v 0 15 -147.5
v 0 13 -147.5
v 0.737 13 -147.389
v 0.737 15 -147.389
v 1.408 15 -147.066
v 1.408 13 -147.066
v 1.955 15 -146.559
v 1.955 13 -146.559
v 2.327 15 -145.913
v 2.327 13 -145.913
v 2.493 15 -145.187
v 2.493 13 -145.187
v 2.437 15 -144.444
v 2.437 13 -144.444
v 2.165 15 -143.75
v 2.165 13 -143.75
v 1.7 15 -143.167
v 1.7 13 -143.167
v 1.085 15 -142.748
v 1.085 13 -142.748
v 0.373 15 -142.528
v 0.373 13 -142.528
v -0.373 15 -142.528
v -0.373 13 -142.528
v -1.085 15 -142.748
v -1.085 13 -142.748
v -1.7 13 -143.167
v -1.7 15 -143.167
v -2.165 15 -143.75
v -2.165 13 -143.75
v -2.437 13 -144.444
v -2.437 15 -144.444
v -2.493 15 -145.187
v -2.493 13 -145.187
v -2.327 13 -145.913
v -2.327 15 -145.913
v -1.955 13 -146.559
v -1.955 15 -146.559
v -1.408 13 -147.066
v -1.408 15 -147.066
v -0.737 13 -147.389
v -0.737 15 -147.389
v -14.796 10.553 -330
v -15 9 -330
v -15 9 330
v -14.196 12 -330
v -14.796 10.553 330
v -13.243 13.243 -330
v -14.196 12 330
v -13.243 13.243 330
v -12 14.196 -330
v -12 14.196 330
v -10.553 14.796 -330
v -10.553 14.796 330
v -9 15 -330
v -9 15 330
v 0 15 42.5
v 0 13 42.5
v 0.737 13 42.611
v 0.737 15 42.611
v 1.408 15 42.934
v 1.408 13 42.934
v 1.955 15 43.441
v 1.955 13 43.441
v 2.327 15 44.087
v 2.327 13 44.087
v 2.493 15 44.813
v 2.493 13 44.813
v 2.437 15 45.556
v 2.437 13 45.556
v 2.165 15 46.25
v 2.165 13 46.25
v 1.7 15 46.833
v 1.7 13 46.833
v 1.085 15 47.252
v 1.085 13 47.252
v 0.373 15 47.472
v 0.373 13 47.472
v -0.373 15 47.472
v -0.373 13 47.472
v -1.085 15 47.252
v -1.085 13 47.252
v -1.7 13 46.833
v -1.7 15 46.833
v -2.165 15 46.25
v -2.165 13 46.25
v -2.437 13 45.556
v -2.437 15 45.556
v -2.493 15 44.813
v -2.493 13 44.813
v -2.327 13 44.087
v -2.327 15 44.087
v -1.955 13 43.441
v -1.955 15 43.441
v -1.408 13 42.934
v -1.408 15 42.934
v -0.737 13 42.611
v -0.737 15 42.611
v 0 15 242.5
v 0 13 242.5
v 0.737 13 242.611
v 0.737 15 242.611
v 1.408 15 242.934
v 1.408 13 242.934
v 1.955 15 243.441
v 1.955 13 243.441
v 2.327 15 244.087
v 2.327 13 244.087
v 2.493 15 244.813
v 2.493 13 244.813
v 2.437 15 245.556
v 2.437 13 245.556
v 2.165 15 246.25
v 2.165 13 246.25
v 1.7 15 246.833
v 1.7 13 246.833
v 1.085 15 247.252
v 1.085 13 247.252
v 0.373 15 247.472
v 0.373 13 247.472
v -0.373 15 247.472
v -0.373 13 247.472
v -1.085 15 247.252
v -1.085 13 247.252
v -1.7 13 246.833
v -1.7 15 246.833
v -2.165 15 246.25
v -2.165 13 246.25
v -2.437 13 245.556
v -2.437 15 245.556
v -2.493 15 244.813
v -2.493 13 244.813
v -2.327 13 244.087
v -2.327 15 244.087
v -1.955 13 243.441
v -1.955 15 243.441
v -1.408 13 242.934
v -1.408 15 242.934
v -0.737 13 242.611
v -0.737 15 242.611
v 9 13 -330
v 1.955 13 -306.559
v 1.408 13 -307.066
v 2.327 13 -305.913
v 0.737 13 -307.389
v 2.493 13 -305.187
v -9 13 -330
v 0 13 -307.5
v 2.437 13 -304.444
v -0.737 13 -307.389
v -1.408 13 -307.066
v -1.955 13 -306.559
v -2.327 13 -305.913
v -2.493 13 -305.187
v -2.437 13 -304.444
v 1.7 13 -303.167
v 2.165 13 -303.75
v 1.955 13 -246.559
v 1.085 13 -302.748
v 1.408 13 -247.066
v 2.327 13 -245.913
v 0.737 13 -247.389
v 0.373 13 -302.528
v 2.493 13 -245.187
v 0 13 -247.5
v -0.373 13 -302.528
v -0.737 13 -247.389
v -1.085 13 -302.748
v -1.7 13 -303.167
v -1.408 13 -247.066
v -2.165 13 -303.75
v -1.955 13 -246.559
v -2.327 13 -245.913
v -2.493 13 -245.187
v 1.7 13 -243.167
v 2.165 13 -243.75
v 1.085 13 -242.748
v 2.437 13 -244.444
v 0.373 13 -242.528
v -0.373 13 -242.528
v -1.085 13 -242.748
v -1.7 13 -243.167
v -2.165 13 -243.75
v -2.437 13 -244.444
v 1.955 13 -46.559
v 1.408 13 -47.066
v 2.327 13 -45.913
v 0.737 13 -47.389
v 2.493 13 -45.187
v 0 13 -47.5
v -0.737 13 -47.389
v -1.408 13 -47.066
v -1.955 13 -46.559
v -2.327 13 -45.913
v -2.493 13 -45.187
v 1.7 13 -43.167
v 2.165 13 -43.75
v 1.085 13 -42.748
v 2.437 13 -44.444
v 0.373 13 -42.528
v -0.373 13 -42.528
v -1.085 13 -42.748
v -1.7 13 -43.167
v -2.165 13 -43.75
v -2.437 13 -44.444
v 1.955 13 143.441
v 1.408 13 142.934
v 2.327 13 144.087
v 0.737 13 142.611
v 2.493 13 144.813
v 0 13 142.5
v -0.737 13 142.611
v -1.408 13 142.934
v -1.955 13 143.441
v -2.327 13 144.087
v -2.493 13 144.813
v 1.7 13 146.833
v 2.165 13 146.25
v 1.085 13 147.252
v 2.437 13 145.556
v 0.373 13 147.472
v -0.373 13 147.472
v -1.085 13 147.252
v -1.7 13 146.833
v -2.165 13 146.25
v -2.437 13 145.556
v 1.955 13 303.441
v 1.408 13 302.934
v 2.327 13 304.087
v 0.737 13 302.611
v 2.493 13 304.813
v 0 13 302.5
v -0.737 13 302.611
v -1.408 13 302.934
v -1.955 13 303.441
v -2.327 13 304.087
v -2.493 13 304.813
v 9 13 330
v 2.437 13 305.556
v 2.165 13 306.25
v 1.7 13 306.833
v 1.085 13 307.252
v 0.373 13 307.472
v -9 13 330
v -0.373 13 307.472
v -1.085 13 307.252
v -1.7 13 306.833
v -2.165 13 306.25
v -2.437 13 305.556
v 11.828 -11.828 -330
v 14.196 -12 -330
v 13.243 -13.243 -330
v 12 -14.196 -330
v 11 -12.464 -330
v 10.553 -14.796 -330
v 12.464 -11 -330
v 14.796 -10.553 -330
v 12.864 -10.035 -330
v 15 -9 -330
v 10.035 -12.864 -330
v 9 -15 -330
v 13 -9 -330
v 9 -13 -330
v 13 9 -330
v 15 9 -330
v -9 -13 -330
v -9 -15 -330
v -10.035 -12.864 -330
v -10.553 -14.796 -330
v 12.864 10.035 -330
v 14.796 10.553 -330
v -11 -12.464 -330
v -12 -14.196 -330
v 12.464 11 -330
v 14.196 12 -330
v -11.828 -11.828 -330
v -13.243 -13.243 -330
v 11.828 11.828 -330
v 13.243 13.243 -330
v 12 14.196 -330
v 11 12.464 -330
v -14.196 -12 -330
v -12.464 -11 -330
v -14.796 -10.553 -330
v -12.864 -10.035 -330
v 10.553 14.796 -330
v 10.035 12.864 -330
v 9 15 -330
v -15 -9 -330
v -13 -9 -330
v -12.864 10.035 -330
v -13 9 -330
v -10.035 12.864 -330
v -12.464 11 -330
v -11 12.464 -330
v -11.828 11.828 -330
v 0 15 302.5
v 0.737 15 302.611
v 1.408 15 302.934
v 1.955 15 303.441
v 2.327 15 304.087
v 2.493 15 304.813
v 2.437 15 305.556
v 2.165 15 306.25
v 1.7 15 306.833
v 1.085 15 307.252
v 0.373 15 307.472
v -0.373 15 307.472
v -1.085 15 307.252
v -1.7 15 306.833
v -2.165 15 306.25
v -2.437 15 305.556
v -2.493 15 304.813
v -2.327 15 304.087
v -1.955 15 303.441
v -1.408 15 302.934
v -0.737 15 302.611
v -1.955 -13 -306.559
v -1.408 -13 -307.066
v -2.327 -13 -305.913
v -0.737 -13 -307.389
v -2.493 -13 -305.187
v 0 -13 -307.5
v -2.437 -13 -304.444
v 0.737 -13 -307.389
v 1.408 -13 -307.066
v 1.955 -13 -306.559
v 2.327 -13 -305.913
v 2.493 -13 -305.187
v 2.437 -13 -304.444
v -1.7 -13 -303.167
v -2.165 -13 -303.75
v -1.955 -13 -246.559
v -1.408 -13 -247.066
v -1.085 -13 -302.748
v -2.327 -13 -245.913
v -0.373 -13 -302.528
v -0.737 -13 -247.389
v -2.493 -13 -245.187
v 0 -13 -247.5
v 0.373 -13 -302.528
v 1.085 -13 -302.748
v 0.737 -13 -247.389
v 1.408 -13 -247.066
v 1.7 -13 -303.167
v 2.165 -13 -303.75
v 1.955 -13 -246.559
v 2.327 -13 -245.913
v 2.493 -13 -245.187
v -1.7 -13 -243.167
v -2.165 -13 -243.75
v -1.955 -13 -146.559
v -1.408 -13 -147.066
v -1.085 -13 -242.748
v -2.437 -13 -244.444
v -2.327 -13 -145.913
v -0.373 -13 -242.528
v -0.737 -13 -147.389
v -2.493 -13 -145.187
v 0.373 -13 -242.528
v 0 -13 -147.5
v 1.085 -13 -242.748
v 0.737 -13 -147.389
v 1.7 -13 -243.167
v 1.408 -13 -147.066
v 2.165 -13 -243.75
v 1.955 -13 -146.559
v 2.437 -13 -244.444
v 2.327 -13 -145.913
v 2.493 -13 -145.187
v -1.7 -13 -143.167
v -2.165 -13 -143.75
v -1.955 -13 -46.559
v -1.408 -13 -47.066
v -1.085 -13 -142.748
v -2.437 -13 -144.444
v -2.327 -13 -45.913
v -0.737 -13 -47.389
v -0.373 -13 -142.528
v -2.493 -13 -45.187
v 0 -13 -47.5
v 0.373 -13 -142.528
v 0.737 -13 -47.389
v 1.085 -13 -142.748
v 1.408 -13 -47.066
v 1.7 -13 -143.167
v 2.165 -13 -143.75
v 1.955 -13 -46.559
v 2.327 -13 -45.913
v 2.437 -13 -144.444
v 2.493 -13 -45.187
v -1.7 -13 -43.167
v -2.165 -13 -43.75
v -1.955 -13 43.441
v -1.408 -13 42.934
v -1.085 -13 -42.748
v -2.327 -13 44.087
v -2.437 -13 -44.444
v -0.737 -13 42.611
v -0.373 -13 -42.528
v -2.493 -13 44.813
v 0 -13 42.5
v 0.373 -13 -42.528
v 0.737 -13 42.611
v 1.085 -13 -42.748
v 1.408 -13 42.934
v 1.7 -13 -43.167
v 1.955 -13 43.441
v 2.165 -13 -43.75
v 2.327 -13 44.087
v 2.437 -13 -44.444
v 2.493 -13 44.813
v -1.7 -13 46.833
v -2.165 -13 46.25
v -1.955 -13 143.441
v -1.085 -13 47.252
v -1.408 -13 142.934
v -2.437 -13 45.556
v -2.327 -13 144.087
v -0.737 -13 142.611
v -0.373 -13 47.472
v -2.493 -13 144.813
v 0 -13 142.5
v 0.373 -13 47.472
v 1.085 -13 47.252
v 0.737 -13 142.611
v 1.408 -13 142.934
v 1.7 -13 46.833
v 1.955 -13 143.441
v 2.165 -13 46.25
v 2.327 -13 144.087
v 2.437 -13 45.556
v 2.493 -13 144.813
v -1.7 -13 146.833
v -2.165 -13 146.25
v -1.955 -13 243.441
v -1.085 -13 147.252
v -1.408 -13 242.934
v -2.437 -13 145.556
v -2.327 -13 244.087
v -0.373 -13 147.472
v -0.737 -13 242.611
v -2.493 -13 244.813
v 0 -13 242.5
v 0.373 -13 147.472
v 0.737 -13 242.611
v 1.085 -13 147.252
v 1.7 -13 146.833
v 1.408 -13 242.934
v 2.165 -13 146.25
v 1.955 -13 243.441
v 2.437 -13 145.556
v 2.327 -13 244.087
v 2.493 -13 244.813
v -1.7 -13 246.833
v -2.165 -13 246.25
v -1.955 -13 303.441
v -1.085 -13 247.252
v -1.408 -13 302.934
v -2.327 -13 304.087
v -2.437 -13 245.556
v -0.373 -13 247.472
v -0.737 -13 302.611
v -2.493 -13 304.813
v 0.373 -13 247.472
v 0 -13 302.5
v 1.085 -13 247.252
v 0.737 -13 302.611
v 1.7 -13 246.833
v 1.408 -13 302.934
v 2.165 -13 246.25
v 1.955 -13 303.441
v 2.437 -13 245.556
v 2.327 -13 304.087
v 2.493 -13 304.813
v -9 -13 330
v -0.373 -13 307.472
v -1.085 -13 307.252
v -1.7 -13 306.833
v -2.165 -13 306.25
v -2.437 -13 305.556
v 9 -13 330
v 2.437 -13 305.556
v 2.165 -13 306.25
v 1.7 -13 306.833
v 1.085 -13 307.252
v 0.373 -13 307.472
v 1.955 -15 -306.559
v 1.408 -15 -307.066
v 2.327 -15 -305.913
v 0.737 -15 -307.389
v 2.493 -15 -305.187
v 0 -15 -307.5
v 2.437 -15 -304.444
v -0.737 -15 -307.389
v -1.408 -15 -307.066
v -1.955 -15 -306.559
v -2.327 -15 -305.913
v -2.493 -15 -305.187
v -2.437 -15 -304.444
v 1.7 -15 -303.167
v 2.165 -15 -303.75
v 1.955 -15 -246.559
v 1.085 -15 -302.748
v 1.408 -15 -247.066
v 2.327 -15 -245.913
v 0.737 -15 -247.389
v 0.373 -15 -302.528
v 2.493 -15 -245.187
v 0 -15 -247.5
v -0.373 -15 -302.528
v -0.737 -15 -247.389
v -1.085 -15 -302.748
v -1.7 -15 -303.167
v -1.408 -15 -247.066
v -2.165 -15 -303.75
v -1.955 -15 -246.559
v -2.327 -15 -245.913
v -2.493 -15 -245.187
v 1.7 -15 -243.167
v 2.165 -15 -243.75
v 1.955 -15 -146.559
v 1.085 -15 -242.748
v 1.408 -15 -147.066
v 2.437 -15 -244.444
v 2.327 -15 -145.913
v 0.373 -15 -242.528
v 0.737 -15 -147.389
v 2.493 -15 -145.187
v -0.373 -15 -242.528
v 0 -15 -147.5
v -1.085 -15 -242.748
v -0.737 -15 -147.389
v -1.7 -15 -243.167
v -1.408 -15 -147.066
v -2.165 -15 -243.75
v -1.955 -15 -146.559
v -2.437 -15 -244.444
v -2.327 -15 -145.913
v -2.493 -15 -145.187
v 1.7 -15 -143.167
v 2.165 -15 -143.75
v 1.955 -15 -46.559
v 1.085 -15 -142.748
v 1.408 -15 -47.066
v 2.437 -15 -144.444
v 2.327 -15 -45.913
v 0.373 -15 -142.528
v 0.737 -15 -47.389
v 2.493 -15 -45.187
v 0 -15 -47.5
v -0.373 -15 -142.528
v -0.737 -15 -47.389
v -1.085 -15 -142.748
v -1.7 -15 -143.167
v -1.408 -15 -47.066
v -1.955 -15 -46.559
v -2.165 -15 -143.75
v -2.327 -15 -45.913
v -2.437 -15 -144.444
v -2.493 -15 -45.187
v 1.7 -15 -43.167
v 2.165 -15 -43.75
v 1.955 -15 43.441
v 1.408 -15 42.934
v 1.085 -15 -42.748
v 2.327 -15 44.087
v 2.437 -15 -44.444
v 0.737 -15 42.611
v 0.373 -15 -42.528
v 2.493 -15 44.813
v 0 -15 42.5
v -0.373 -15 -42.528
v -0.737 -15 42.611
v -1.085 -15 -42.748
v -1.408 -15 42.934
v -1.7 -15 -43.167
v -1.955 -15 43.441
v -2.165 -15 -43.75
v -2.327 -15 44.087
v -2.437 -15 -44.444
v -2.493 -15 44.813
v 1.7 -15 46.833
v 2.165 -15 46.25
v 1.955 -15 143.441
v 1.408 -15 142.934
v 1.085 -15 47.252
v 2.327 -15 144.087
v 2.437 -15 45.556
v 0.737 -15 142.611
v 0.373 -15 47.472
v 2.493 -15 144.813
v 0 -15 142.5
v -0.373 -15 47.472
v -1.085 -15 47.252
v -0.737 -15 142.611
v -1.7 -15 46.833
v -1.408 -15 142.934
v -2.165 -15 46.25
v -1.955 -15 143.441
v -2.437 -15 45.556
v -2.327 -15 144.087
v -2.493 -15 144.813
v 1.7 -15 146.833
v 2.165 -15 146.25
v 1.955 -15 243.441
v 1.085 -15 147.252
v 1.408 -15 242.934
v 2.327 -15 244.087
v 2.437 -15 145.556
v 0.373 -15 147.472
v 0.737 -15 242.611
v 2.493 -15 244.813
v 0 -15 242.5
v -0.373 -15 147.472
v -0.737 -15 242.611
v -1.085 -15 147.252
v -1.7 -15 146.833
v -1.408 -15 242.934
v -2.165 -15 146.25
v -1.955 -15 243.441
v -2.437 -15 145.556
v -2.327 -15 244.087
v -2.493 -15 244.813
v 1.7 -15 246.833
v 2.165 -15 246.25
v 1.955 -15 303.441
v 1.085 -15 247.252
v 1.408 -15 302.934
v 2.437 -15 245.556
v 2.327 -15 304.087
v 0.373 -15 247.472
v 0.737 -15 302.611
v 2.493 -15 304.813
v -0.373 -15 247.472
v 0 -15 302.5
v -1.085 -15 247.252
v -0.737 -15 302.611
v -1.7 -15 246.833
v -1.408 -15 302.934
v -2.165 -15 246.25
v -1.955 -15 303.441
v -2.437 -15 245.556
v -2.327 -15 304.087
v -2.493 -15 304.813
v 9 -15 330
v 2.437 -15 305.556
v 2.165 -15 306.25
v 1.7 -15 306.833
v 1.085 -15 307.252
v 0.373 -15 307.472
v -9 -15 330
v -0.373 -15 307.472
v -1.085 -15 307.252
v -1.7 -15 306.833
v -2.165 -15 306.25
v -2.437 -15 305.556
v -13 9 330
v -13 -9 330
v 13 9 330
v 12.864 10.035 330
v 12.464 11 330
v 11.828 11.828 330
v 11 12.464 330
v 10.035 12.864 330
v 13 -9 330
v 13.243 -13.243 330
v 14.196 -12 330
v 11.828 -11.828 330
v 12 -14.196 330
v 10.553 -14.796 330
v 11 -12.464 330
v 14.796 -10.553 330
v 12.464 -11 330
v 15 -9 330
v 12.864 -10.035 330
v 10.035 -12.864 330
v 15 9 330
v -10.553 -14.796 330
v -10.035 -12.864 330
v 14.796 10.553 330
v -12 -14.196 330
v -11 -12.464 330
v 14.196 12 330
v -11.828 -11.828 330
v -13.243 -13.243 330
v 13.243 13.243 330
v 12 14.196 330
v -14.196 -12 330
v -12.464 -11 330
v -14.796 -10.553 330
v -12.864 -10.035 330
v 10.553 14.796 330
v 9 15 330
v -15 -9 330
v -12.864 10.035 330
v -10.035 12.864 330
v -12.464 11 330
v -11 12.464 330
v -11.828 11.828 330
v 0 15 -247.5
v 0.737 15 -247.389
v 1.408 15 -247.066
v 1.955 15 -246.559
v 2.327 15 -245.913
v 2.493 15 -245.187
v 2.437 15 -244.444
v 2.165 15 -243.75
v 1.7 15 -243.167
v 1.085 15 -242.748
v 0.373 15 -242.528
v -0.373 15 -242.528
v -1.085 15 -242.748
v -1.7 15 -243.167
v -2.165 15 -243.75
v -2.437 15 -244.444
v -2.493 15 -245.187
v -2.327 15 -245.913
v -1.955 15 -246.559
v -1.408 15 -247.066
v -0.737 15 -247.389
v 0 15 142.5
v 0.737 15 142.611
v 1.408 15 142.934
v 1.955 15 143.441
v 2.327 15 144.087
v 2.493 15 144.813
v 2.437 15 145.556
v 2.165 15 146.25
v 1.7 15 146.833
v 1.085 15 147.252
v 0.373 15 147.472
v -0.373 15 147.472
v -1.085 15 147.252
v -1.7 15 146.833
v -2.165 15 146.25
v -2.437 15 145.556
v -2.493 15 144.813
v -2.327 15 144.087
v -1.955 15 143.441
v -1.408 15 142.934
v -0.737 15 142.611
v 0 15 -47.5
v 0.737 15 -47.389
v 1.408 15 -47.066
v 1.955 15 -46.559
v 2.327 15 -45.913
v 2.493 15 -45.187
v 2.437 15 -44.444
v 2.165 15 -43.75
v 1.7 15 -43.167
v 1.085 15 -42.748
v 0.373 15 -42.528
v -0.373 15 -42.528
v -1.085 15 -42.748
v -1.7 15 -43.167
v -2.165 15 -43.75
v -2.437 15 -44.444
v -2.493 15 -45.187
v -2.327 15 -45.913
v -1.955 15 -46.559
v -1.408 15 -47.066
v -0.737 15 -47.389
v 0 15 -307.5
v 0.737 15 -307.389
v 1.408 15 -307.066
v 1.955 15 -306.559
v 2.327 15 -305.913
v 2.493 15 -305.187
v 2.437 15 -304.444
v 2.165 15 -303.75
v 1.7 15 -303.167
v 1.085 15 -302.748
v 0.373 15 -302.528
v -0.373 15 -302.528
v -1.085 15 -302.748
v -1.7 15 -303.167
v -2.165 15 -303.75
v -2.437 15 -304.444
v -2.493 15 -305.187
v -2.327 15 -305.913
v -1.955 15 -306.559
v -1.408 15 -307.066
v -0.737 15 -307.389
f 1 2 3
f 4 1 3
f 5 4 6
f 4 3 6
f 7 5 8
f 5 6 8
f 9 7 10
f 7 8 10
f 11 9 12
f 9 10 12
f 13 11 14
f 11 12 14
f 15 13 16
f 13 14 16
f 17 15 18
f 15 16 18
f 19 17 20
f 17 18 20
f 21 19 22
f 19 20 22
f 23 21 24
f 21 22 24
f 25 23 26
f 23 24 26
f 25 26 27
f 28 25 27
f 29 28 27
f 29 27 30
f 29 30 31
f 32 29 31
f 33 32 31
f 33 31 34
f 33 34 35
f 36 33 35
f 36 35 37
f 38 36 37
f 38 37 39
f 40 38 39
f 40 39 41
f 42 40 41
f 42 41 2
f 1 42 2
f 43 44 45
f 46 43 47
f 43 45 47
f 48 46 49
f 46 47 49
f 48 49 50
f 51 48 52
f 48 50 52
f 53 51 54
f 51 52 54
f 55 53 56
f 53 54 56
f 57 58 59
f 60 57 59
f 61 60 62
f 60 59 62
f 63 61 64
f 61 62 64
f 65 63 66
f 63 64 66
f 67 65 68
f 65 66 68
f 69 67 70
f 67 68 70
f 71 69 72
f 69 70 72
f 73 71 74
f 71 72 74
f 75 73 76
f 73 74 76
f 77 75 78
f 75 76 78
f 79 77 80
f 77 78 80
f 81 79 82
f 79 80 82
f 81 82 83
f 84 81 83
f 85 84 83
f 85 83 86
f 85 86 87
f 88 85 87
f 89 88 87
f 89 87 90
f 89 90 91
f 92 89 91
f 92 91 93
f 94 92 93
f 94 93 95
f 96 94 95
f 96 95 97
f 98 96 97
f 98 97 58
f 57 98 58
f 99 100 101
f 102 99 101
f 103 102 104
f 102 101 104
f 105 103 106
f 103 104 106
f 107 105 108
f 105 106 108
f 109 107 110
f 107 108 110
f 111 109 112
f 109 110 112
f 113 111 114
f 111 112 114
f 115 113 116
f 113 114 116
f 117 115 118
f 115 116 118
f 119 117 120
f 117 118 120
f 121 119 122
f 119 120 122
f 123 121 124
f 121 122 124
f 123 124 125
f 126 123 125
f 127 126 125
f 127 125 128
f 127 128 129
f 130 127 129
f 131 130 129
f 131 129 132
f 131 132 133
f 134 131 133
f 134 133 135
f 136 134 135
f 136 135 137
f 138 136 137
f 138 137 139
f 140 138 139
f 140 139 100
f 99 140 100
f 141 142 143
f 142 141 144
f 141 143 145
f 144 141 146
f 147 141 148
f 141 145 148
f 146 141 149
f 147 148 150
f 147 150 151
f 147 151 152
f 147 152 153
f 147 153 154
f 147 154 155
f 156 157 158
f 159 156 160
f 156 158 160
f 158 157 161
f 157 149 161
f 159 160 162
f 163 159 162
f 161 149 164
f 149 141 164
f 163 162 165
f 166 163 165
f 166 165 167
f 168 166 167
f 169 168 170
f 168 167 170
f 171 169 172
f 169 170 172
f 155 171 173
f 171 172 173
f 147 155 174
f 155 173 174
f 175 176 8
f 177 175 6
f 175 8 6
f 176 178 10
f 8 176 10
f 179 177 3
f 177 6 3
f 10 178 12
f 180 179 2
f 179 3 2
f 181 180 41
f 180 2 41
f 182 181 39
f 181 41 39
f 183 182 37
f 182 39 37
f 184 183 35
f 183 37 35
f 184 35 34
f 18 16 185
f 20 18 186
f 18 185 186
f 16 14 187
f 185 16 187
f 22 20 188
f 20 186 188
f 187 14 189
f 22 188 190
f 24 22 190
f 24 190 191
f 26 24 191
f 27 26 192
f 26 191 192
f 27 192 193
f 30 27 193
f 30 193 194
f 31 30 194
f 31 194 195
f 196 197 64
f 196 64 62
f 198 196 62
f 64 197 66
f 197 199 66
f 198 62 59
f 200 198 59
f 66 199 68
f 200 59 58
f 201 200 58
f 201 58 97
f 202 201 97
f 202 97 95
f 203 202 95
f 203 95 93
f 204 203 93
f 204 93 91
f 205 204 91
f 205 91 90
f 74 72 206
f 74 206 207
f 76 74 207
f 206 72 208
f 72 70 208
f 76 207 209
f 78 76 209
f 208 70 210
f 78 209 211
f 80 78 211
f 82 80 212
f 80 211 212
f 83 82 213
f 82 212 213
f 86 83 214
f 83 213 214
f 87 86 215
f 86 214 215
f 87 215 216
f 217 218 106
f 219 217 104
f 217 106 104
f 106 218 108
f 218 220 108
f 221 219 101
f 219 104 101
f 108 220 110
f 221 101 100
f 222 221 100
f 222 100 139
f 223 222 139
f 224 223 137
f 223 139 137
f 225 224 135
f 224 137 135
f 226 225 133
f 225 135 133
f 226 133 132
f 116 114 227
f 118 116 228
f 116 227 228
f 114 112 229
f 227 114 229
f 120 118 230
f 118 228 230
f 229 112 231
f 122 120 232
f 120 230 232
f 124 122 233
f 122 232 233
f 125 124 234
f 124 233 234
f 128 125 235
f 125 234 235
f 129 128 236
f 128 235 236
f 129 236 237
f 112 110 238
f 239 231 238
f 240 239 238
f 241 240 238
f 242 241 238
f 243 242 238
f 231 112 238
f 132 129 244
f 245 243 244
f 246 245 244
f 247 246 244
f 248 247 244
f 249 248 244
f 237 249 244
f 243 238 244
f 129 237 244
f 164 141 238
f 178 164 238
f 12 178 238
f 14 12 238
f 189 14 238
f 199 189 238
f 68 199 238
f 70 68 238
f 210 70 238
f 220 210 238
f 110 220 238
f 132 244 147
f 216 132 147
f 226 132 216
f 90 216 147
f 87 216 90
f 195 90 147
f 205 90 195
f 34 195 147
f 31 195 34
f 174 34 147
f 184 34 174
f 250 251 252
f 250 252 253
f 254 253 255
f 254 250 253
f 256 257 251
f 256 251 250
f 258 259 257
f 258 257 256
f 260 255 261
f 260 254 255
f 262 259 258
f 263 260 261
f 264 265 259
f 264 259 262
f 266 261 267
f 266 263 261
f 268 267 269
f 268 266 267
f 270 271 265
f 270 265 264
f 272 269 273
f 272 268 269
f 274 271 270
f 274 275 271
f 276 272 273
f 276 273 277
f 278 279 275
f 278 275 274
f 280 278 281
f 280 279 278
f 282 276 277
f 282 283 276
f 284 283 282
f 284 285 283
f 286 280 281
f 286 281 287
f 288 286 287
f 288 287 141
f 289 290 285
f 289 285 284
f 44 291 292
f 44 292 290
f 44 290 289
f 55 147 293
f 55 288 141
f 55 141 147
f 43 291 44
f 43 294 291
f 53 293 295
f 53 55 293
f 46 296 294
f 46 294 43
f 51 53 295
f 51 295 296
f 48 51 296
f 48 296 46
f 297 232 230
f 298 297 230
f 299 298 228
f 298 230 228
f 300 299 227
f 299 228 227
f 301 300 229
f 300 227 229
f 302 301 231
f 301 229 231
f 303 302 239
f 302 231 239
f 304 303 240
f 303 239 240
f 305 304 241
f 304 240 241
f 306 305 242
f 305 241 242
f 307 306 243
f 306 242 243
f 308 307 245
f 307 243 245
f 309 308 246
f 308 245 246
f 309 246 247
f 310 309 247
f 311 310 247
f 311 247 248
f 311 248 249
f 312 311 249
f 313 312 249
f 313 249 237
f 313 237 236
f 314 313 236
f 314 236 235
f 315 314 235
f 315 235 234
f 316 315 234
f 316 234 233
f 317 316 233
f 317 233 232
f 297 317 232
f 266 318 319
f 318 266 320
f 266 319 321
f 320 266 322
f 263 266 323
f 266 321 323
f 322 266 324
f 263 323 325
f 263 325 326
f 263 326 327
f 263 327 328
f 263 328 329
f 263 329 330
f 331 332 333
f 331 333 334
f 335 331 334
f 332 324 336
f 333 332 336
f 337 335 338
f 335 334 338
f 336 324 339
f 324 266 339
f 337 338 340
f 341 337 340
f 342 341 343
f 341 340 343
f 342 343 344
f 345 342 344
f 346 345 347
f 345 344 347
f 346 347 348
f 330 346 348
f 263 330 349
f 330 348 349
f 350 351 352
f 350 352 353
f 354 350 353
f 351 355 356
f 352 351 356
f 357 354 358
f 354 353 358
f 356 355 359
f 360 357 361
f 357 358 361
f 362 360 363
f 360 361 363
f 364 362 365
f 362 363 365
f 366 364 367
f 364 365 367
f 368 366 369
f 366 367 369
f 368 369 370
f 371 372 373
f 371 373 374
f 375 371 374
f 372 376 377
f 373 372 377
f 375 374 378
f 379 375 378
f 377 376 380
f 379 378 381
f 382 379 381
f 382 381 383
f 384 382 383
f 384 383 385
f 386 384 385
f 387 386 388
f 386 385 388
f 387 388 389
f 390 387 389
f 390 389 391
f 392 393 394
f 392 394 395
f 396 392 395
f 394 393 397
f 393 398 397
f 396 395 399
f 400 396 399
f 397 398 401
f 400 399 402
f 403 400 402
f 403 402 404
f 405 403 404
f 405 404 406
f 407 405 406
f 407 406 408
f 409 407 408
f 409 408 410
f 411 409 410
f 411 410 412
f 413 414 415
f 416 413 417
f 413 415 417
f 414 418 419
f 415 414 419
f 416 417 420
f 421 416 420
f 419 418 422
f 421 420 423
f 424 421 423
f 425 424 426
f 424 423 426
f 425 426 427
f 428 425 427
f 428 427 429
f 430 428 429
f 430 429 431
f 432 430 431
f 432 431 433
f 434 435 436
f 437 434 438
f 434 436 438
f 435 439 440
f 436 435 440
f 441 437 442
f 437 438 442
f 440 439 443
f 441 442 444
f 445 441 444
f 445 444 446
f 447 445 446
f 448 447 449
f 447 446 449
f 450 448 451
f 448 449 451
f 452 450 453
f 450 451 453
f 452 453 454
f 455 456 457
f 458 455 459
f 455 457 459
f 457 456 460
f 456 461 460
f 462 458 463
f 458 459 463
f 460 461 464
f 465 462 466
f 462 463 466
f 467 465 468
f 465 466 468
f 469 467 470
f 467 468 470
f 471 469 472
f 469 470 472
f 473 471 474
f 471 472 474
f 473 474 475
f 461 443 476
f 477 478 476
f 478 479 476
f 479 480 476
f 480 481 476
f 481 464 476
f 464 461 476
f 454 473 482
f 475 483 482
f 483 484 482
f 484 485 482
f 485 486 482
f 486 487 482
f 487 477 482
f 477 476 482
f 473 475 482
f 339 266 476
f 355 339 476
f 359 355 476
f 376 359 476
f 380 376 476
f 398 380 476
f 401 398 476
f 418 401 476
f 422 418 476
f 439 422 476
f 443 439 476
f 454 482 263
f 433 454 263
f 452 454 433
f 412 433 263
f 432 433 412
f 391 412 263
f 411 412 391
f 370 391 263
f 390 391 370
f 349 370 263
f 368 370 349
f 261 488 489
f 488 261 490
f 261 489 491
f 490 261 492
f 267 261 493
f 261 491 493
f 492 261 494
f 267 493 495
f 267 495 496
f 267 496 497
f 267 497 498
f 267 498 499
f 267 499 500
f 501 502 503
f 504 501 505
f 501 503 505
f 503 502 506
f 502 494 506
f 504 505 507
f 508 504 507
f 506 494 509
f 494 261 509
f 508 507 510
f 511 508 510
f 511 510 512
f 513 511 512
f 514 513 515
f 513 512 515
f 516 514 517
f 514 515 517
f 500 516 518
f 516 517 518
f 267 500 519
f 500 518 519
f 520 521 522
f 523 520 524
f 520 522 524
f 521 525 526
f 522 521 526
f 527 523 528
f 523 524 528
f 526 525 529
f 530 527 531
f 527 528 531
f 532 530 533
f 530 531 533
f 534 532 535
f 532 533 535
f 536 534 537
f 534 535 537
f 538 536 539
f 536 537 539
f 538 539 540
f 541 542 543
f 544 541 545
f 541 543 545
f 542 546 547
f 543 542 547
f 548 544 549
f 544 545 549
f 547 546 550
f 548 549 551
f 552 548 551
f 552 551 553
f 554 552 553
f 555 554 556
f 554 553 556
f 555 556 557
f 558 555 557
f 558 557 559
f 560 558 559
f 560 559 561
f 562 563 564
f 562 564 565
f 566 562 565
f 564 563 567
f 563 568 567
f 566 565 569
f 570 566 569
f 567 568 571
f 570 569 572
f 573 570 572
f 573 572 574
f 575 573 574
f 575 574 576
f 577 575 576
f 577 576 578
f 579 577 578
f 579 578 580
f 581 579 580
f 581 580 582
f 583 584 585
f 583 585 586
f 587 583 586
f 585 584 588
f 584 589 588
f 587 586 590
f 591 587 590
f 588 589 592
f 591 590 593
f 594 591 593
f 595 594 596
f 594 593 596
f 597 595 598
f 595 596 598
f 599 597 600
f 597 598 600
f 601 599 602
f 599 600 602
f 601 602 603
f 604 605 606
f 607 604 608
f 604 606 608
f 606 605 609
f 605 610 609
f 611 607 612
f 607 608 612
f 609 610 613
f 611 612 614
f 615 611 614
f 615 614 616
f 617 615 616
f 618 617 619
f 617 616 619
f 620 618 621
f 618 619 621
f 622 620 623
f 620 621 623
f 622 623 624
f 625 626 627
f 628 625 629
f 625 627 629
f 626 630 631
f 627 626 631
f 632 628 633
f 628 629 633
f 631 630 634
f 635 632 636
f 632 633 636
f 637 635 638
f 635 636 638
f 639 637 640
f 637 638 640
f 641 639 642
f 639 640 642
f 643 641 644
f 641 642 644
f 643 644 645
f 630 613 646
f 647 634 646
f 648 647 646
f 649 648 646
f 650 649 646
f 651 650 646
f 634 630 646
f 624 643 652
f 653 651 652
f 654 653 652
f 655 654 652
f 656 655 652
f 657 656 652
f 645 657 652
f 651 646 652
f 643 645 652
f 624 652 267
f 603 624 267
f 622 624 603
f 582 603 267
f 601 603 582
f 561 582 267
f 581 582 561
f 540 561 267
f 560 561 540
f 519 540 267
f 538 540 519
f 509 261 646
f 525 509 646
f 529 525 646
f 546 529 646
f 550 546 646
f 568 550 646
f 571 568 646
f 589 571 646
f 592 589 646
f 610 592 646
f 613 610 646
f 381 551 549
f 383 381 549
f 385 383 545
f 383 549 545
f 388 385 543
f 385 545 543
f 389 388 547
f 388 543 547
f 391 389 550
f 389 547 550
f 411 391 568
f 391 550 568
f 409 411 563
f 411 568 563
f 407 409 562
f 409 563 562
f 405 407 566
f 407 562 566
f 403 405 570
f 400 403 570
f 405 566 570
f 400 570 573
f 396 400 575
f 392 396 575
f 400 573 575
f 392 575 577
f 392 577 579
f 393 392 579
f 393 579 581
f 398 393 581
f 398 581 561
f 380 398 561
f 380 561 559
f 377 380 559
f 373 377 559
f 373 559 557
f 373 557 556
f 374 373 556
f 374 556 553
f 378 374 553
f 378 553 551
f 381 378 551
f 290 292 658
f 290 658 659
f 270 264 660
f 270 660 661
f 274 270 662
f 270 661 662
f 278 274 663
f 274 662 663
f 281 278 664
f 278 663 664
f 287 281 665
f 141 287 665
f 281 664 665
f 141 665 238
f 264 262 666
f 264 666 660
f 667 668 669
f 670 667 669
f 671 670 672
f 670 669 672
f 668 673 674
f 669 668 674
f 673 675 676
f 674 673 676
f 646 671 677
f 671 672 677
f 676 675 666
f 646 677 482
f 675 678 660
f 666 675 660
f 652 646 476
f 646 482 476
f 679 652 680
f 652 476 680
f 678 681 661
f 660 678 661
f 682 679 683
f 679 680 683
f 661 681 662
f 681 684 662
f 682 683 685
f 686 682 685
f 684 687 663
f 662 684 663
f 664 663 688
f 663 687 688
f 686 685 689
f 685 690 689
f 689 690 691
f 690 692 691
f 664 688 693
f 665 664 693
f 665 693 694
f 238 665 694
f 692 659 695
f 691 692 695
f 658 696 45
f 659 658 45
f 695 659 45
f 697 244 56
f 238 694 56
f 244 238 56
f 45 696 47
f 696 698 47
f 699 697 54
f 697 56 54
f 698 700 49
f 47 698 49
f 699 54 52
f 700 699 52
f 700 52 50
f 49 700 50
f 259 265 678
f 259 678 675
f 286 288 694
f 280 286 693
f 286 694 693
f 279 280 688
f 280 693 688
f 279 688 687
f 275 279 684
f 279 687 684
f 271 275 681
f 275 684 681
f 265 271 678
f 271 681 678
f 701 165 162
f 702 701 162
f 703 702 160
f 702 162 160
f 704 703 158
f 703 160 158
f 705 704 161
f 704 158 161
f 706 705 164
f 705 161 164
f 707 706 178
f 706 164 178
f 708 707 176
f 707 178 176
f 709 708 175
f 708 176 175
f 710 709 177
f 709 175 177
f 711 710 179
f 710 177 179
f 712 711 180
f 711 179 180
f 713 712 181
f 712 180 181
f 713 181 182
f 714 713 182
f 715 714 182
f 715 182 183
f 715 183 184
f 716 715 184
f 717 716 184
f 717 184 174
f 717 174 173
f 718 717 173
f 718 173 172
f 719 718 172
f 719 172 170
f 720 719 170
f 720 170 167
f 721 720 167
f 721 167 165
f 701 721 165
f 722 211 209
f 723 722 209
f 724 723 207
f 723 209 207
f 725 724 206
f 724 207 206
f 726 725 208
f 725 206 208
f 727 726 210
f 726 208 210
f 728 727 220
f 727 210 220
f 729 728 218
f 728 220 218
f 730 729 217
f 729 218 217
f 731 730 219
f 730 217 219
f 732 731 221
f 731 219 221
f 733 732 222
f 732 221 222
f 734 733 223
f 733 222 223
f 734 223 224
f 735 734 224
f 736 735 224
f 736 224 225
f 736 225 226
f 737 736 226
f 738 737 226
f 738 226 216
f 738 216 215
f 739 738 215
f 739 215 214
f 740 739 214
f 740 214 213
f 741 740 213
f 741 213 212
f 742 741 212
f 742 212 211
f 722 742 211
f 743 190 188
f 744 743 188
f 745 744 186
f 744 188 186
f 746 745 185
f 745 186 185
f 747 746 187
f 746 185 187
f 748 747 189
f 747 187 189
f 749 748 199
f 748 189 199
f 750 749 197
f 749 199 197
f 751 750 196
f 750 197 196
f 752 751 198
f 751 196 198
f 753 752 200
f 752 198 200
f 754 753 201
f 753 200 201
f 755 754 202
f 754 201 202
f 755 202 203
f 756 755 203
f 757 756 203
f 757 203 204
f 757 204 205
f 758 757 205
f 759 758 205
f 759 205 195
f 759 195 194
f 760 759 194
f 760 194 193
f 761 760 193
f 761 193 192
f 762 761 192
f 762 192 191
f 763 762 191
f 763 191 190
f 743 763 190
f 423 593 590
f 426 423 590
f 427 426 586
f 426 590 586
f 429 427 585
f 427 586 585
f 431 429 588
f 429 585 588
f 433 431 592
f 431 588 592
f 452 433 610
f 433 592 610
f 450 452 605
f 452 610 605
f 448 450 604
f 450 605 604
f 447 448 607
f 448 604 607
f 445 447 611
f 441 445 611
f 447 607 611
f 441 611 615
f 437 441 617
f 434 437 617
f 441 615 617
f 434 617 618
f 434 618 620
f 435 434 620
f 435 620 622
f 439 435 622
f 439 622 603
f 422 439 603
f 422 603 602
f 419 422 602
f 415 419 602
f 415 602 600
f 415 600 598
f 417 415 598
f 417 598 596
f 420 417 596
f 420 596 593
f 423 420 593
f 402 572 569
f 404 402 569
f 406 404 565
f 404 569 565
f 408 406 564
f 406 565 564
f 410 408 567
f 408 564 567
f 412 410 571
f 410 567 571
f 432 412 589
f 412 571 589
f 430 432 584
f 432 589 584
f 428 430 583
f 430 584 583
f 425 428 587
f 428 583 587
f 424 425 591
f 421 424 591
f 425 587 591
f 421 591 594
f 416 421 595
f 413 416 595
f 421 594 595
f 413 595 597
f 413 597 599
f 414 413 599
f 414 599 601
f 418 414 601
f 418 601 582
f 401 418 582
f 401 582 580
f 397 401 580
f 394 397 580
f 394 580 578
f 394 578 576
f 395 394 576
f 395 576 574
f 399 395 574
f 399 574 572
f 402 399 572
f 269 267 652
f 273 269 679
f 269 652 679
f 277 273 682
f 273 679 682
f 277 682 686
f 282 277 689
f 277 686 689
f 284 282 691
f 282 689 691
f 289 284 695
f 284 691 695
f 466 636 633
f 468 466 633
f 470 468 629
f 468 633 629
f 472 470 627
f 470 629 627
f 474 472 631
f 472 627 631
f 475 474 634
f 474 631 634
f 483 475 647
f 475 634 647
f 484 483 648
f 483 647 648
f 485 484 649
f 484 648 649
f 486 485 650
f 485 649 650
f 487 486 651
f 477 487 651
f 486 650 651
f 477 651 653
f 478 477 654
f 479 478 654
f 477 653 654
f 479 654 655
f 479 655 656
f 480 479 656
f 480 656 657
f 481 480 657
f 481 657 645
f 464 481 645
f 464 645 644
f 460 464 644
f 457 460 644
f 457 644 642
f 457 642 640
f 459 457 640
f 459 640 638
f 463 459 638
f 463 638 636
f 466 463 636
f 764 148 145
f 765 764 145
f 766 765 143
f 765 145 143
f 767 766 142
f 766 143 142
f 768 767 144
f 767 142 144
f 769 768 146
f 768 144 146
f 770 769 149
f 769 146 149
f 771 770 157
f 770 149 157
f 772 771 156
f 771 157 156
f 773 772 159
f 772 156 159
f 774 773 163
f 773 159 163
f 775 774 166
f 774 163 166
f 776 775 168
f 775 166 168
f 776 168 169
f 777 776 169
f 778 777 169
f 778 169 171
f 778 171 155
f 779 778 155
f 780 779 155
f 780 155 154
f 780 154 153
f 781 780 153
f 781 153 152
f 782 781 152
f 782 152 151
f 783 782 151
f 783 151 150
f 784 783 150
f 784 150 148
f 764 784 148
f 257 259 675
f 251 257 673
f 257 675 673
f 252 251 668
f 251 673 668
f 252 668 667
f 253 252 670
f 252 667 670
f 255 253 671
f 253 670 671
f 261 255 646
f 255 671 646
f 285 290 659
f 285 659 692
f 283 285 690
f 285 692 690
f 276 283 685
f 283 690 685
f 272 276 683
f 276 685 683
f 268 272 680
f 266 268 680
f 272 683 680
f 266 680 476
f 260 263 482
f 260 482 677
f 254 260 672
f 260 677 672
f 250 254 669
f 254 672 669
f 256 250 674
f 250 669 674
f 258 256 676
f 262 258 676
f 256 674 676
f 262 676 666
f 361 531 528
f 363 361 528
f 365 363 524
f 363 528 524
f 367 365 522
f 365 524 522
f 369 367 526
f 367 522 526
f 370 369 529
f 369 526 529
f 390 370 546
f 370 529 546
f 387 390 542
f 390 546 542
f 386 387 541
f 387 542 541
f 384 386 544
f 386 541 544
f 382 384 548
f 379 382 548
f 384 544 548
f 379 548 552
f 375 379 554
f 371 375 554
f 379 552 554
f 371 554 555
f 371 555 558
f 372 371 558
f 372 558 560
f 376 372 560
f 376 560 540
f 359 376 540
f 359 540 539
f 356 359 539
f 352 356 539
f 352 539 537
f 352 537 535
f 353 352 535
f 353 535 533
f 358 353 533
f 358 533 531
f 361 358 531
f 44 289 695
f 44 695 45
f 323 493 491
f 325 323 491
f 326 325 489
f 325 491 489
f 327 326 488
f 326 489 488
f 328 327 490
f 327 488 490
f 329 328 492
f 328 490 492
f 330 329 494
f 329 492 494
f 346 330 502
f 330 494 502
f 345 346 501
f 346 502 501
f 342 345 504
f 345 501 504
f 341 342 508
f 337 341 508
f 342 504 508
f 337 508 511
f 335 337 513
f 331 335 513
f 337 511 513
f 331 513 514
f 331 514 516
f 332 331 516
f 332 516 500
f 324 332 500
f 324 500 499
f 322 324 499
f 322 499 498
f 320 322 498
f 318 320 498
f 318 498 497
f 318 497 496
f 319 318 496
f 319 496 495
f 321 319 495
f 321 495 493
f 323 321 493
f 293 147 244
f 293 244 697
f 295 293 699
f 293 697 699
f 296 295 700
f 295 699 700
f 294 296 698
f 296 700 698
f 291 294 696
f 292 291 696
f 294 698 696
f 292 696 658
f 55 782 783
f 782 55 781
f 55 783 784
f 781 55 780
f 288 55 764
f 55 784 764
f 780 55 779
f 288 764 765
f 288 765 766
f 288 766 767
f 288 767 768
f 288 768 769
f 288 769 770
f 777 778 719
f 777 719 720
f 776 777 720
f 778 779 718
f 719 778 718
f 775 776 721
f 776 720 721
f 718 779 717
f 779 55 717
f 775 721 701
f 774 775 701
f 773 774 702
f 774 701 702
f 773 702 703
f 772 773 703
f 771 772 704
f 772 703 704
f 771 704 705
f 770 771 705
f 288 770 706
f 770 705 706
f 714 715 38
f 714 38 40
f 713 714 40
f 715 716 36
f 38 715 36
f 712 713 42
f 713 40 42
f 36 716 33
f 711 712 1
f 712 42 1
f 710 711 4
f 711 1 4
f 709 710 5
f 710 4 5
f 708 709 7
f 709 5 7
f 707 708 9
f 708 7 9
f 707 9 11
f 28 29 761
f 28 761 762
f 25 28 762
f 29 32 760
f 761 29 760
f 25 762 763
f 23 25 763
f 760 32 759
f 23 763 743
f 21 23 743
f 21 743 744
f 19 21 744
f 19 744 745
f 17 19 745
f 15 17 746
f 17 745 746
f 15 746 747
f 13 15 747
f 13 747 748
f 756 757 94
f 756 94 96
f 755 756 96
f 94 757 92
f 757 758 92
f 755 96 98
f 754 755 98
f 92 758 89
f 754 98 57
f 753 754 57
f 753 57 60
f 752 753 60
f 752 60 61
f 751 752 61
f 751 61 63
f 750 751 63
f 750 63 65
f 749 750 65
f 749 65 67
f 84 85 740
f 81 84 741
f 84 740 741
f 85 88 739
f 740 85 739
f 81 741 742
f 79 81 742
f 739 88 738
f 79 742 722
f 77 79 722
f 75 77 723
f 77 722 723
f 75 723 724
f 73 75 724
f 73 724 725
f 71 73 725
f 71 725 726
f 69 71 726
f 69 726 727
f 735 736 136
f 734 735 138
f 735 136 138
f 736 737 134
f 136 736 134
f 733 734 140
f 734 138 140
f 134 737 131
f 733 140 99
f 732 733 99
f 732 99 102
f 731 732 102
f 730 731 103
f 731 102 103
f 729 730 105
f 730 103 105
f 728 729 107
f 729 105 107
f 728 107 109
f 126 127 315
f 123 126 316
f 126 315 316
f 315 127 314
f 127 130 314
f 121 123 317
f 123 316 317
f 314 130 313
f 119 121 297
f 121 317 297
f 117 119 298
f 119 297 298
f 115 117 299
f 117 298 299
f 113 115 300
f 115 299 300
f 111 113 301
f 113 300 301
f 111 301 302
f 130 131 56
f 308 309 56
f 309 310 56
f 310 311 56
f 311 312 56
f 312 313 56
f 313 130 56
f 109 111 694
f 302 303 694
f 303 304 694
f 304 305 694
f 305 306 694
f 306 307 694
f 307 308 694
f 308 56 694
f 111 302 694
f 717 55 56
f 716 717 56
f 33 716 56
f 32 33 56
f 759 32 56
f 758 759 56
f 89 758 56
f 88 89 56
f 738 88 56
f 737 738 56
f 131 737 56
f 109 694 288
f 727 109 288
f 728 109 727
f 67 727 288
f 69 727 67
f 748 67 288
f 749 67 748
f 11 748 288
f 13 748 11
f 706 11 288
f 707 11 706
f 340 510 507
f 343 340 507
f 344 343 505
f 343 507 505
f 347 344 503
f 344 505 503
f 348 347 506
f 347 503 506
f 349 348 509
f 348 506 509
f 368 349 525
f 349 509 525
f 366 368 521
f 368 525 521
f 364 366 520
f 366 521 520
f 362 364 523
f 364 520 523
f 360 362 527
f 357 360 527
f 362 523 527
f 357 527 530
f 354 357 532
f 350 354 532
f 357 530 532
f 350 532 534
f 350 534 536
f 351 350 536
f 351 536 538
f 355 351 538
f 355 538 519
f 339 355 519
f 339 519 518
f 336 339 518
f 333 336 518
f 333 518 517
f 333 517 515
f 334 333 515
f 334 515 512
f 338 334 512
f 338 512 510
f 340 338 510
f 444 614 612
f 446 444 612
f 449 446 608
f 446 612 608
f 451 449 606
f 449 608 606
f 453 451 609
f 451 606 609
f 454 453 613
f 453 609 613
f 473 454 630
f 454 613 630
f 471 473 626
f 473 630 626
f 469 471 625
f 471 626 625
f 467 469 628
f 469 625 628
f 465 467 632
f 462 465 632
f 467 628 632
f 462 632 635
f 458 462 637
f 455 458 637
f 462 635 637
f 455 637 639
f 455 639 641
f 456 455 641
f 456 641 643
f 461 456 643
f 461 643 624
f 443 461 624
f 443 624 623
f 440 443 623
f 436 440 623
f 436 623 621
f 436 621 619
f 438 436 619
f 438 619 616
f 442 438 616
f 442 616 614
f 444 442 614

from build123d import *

# Parameters (mm, degrees)
AUFSATZ_LINEAR_AUSTRAGEN1_DEPTH = 330
SKIZZE2_R                       = 2.5
SCHNITT_LINEAR_AUSTRAGEN1_DEPTH = 60


with BuildPart() as part:
    # Skizze1 → Aufsatz-Linear austragen1 (new, symmetric)
    with BuildSketch(Plane.XY):
        with BuildLine():
            Line((-9, 15), (9, 15))
            ThreePointArc((9, 15), (13.242640687, 13.242640687), (15, 9))
            Line((15, 9), (15, -9))
            ThreePointArc((15, -9), (13.242640687, -13.242640687), (9, -15))
            Line((9, -15), (-9, -15))
            ThreePointArc((-9, -15), (-13.242640687, -13.242640687), (-15, -9))
            Line((-15, -9), (-15, 9))
            ThreePointArc((-15, 9), (-13.242640687, 13.242640687), (-9, 15))
        make_face()
        with BuildLine():
            Line((-13, 9), (-13, -9))
            ThreePointArc((-13, -9), (-11.828427125, -11.828427125), (-9, -13))
            Line((-9, -13), (9, -13))
            ThreePointArc((9, -13), (11.828427125, -11.828427125), (13, -9))
            Line((13, -9), (13, 9))
            ThreePointArc((13, 9), (11.828427125, 11.828427125), (9, 13))
            Line((9, 13), (-9, 13))
            ThreePointArc((-9, 13), (-11.828427125, 11.828427125), (-13, 9))
        make_face(mode=Mode.SUBTRACT)
    extrude(amount=AUFSATZ_LINEAR_AUSTRAGEN1_DEPTH, both=True)

    # Skizze2 → Schnitt-Linear austragen1 (cut)
    with BuildSketch(Plane.XZ.offset(15)):
        with Locations(Location((0, -305, 0), (0, 0, 270))):
            Circle(SKIZZE2_R)
        with Locations(Location((0, -245, 0), (0, 0, 270))):
            Circle(SKIZZE2_R)
        with Locations(Location((0, -145, 0), (0, 0, 270))):
            Circle(SKIZZE2_R)
        with Locations(Location((0, -45, 0), (0, 0, 270))):
            Circle(SKIZZE2_R)
        with Locations(Location((0, 45, 0), (0, 0, 270))):
            Circle(SKIZZE2_R)
        with Locations(Location((0, 145, 0), (0, 0, 270))):
            Circle(SKIZZE2_R)
        with Locations(Location((0, 245, 0), (0, 0, 270))):
            Circle(SKIZZE2_R)
        with Locations(Location((0, 305, 0), (0, 0, 270))):
            Circle(SKIZZE2_R)
    extrude(amount=-SCHNITT_LINEAR_AUSTRAGEN1_DEPTH, mode=Mode.SUBTRACT)


solid = part.part
